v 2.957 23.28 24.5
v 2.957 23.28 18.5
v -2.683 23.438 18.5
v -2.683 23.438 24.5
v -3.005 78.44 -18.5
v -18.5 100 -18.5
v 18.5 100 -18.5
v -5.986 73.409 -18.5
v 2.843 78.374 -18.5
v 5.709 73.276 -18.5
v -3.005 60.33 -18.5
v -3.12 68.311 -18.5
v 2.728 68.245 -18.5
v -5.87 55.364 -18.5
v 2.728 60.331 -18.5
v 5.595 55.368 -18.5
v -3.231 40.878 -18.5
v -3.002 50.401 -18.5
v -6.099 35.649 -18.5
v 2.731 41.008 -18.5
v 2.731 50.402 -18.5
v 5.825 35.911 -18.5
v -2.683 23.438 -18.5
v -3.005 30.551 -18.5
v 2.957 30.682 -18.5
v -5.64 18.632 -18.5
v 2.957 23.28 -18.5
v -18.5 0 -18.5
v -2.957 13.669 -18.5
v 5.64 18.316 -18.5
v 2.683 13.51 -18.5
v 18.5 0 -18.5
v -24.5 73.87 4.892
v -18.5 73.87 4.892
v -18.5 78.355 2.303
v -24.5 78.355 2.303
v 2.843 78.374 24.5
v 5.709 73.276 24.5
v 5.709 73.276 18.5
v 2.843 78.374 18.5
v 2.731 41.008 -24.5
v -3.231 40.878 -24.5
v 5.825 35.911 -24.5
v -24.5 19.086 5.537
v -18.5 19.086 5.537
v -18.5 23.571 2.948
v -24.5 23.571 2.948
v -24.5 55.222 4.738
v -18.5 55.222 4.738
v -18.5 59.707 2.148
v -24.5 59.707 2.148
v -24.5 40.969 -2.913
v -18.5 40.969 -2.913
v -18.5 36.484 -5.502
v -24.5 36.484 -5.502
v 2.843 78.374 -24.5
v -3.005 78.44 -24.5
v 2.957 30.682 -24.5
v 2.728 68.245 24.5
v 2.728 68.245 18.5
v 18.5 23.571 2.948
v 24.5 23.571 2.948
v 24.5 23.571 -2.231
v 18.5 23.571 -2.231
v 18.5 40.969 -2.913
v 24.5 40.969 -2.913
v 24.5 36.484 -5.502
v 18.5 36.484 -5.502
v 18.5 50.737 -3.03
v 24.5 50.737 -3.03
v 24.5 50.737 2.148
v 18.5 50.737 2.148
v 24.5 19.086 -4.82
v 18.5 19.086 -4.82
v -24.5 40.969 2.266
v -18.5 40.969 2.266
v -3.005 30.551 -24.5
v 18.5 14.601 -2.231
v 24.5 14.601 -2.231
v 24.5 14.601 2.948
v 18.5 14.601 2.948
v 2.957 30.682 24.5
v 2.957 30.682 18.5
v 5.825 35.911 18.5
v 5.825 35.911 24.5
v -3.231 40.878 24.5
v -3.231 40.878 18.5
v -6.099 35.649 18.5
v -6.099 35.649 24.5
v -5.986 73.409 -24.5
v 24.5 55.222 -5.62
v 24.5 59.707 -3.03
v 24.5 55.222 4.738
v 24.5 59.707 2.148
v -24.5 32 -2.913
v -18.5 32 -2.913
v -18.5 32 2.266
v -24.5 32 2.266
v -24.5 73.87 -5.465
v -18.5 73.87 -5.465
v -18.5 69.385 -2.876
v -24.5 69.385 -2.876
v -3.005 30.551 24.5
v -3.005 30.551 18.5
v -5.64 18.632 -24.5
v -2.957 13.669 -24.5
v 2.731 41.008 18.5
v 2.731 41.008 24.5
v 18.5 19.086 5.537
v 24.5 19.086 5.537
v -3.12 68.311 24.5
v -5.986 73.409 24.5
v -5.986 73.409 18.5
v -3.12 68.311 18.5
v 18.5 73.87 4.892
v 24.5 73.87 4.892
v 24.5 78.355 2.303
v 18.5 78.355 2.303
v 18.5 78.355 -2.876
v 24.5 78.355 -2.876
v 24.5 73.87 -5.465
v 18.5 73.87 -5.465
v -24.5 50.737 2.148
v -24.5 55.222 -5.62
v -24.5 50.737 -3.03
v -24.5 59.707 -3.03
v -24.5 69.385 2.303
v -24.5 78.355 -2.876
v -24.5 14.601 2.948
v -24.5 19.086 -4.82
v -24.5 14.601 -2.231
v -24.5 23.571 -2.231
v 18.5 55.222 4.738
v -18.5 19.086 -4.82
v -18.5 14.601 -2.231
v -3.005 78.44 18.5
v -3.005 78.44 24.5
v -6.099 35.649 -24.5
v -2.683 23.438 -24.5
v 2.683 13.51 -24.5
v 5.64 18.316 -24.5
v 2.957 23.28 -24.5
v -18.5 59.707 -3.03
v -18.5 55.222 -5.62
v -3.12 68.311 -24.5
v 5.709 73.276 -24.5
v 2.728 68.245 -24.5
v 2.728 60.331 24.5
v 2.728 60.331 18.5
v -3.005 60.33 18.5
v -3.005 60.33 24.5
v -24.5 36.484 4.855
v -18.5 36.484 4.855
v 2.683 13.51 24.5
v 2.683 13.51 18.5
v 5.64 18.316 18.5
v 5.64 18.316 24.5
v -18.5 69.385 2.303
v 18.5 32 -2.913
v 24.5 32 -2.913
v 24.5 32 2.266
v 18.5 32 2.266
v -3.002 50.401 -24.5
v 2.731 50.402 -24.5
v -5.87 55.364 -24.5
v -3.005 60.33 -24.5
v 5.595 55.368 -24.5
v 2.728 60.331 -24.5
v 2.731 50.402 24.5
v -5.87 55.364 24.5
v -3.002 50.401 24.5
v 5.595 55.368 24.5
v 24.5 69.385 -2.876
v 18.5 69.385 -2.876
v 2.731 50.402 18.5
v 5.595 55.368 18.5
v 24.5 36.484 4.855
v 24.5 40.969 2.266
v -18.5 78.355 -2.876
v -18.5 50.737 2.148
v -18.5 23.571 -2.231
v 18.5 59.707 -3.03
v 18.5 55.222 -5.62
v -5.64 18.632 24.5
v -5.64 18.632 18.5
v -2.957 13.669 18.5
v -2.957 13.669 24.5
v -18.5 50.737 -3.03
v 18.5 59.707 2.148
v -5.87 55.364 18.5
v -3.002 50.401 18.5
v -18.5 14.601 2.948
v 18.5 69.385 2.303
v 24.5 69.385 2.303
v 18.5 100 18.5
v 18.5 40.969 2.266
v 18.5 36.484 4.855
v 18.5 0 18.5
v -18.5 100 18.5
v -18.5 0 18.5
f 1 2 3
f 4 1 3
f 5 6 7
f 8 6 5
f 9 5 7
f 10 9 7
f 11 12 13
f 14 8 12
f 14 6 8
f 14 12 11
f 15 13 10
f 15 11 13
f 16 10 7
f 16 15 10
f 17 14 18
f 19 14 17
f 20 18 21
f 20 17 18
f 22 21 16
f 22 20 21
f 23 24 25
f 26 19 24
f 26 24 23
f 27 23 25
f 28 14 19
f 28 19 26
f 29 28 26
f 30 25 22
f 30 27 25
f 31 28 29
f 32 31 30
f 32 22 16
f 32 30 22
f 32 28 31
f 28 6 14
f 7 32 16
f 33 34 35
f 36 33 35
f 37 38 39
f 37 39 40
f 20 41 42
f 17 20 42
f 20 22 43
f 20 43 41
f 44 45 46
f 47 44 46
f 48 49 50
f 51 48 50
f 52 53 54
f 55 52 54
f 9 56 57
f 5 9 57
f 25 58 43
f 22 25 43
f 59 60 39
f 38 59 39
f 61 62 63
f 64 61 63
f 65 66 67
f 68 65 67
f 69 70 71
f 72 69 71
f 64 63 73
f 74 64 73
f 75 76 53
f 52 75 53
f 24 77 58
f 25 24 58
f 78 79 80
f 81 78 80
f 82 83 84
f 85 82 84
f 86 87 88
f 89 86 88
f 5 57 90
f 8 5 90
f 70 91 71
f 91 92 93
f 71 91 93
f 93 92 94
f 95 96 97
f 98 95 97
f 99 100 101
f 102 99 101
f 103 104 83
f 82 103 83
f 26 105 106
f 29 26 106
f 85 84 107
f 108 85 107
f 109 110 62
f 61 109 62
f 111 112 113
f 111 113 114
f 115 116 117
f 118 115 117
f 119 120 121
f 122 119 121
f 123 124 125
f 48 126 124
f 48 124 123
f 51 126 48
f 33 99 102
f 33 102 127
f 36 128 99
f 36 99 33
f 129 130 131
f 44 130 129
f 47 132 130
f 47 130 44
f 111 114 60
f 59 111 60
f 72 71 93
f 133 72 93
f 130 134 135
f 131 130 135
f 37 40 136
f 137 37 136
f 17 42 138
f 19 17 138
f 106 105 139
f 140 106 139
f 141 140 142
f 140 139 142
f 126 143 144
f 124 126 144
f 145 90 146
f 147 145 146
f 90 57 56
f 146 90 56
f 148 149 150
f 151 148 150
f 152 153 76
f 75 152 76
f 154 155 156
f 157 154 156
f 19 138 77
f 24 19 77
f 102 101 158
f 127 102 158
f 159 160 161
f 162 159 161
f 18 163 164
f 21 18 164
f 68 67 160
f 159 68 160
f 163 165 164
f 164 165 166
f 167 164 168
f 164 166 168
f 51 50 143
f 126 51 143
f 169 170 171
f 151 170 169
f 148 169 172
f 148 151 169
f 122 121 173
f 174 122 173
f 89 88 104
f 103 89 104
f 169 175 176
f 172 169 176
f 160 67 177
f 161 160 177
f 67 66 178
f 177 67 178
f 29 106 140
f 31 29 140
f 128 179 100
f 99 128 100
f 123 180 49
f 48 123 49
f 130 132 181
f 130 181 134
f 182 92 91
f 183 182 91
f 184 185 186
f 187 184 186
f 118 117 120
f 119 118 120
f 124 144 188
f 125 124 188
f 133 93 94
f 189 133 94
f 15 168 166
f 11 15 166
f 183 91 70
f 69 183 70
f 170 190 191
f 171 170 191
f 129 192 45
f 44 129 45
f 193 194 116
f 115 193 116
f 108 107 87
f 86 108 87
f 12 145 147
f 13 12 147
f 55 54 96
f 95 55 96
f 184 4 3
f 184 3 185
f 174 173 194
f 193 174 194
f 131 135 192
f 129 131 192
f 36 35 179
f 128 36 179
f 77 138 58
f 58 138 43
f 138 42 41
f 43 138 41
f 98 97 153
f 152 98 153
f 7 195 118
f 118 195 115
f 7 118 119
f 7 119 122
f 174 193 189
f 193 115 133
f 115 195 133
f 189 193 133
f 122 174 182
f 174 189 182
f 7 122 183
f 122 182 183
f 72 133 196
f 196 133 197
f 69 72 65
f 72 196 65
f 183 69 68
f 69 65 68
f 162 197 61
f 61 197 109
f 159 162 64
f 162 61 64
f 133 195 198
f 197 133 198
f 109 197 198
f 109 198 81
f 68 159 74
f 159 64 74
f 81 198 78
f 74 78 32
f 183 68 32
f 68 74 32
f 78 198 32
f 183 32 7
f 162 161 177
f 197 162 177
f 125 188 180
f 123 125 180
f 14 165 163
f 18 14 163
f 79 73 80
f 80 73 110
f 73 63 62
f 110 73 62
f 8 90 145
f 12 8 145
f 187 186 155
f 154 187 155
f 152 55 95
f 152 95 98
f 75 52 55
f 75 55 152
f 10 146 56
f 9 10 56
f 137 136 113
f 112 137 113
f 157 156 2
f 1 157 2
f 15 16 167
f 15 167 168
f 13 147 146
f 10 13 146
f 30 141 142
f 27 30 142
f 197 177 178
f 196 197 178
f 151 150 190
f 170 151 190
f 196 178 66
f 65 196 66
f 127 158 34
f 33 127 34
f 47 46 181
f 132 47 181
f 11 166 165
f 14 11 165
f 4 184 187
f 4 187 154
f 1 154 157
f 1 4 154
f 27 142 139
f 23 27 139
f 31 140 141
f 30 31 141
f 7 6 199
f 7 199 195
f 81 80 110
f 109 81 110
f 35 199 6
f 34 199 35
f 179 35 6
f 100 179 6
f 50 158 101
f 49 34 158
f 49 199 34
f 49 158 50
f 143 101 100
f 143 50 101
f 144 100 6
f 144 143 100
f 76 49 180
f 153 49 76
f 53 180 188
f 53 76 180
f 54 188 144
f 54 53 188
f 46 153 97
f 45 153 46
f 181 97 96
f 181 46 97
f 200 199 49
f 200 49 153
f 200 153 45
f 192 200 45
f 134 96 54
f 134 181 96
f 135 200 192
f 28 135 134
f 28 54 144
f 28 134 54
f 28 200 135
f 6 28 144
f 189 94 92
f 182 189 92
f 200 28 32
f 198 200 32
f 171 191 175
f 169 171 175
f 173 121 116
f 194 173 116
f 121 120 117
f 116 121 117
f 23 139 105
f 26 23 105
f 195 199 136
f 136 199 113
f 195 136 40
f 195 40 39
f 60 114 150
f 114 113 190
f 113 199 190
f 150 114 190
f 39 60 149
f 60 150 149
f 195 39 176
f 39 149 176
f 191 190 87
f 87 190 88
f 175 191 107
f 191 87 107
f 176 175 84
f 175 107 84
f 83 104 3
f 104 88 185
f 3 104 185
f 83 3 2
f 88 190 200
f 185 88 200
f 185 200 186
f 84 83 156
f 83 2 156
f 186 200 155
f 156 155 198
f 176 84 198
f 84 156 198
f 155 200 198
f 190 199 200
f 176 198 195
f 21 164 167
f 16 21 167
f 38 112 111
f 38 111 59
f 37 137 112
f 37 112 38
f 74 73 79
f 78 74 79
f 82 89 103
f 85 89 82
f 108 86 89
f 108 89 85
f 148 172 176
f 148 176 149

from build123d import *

# Parameters (mm, degrees)
SKETCH1_W                = 37
SKETCH1_H                = 37
BOSS_EXTRUDE1_DEPTH      = 100
BOSS_EXTRUDE2_DEPTH      = 6
BOSS_EXTRUDE2_DEPTH_BACK = 43
BOSS_EXTRUDE3_DEPTH      = 6
BOSS_EXTRUDE3_DEPTH_BACK = 43


with BuildPart() as part:
    # Sketch1 → Boss-Extrude1 (new body)
    with BuildSketch(Plane(origin=(0, 0, 0), x_dir=(1, 0, 0), z_dir=(0, 1, 0))):
        Rectangle(SKETCH1_W, SKETCH1_H)
    extrude(amount=BOSS_EXTRUDE1_DEPTH)

    # Sketch2 → Boss-Extrude2 (add, two sides: drawn at the far end of the back side and taken through both)
    with BuildSketch(Plane.ZY.offset(18.5).offset(-BOSS_EXTRUDE2_DEPTH_BACK)):
        Polygon((2.947677665, 14.601477232), (5.53699788, 19.086311402), (2.947677665, 23.571145571), (-2.230962765, 23.571145571), (-4.82028298, 19.086311402), (-2.230962765, 14.601477232), align=None)
        Polygon((2.265923415, 31.999576723), (4.85524363, 36.484410892), (2.265923415, 40.969245062), (-2.912717015, 40.969245062), (-5.50203723, 36.484410892), (-2.912717015, 31.999576723), align=None)
        Polygon((2.148184021, 50.736854031), (4.737504236, 55.221688201), (2.148184021, 59.70652237), (-3.030456409, 59.70652237), (-5.619776624, 55.221688201), (-3.030456409, 50.736854031), align=None)
        Polygon((2.302648162, 69.385244476), (4.891968377, 73.870078646), (2.302648162, 78.354912815), (-2.875992268, 78.354912815), (-5.465312483, 73.870078646), (-2.875992268, 69.385244476), align=None)
    extrude(amount=BOSS_EXTRUDE2_DEPTH + BOSS_EXTRUDE2_DEPTH_BACK)

    # Sketch3 → Boss-Extrude3 (add, two sides: drawn at the far end of the back side and taken through both)
    with BuildSketch(Plane.XY.offset(18.5).offset(-BOSS_EXTRUDE3_DEPTH_BACK)):
        Polygon((2.683056757, 13.510428104), (5.640179705, 18.315850916), (2.957122948, 23.279505916), (-2.683056757, 23.437738105), (-5.640179705, 18.632315293), (-2.957122948, 13.668660293), align=None)
        Polygon((2.957122948, 30.681991349), (5.824876018, 35.910513005), (2.730719975, 41.008320843), (-3.231189138, 40.877607026), (-6.098942208, 35.64908537), (-3.004786166, 30.551277532), align=None)
        Polygon((2.730719975, 50.402458514), (5.595494766, 55.367833024), (2.727741696, 60.331488025), (-3.004786166, 60.329768515), (-5.869560957, 55.364394004), (-3.001807886, 50.400739003), align=None)
        Polygon((2.727741696, 68.244785948), (5.709440822, 73.275947245), (2.843176891, 78.373755084), (-3.004786166, 78.440401625), (-5.986485292, 73.409240328), (-3.120221361, 68.311432489), align=None)
    extrude(amount=BOSS_EXTRUDE3_DEPTH + BOSS_EXTRUDE3_DEPTH_BACK)


solid = part.part
